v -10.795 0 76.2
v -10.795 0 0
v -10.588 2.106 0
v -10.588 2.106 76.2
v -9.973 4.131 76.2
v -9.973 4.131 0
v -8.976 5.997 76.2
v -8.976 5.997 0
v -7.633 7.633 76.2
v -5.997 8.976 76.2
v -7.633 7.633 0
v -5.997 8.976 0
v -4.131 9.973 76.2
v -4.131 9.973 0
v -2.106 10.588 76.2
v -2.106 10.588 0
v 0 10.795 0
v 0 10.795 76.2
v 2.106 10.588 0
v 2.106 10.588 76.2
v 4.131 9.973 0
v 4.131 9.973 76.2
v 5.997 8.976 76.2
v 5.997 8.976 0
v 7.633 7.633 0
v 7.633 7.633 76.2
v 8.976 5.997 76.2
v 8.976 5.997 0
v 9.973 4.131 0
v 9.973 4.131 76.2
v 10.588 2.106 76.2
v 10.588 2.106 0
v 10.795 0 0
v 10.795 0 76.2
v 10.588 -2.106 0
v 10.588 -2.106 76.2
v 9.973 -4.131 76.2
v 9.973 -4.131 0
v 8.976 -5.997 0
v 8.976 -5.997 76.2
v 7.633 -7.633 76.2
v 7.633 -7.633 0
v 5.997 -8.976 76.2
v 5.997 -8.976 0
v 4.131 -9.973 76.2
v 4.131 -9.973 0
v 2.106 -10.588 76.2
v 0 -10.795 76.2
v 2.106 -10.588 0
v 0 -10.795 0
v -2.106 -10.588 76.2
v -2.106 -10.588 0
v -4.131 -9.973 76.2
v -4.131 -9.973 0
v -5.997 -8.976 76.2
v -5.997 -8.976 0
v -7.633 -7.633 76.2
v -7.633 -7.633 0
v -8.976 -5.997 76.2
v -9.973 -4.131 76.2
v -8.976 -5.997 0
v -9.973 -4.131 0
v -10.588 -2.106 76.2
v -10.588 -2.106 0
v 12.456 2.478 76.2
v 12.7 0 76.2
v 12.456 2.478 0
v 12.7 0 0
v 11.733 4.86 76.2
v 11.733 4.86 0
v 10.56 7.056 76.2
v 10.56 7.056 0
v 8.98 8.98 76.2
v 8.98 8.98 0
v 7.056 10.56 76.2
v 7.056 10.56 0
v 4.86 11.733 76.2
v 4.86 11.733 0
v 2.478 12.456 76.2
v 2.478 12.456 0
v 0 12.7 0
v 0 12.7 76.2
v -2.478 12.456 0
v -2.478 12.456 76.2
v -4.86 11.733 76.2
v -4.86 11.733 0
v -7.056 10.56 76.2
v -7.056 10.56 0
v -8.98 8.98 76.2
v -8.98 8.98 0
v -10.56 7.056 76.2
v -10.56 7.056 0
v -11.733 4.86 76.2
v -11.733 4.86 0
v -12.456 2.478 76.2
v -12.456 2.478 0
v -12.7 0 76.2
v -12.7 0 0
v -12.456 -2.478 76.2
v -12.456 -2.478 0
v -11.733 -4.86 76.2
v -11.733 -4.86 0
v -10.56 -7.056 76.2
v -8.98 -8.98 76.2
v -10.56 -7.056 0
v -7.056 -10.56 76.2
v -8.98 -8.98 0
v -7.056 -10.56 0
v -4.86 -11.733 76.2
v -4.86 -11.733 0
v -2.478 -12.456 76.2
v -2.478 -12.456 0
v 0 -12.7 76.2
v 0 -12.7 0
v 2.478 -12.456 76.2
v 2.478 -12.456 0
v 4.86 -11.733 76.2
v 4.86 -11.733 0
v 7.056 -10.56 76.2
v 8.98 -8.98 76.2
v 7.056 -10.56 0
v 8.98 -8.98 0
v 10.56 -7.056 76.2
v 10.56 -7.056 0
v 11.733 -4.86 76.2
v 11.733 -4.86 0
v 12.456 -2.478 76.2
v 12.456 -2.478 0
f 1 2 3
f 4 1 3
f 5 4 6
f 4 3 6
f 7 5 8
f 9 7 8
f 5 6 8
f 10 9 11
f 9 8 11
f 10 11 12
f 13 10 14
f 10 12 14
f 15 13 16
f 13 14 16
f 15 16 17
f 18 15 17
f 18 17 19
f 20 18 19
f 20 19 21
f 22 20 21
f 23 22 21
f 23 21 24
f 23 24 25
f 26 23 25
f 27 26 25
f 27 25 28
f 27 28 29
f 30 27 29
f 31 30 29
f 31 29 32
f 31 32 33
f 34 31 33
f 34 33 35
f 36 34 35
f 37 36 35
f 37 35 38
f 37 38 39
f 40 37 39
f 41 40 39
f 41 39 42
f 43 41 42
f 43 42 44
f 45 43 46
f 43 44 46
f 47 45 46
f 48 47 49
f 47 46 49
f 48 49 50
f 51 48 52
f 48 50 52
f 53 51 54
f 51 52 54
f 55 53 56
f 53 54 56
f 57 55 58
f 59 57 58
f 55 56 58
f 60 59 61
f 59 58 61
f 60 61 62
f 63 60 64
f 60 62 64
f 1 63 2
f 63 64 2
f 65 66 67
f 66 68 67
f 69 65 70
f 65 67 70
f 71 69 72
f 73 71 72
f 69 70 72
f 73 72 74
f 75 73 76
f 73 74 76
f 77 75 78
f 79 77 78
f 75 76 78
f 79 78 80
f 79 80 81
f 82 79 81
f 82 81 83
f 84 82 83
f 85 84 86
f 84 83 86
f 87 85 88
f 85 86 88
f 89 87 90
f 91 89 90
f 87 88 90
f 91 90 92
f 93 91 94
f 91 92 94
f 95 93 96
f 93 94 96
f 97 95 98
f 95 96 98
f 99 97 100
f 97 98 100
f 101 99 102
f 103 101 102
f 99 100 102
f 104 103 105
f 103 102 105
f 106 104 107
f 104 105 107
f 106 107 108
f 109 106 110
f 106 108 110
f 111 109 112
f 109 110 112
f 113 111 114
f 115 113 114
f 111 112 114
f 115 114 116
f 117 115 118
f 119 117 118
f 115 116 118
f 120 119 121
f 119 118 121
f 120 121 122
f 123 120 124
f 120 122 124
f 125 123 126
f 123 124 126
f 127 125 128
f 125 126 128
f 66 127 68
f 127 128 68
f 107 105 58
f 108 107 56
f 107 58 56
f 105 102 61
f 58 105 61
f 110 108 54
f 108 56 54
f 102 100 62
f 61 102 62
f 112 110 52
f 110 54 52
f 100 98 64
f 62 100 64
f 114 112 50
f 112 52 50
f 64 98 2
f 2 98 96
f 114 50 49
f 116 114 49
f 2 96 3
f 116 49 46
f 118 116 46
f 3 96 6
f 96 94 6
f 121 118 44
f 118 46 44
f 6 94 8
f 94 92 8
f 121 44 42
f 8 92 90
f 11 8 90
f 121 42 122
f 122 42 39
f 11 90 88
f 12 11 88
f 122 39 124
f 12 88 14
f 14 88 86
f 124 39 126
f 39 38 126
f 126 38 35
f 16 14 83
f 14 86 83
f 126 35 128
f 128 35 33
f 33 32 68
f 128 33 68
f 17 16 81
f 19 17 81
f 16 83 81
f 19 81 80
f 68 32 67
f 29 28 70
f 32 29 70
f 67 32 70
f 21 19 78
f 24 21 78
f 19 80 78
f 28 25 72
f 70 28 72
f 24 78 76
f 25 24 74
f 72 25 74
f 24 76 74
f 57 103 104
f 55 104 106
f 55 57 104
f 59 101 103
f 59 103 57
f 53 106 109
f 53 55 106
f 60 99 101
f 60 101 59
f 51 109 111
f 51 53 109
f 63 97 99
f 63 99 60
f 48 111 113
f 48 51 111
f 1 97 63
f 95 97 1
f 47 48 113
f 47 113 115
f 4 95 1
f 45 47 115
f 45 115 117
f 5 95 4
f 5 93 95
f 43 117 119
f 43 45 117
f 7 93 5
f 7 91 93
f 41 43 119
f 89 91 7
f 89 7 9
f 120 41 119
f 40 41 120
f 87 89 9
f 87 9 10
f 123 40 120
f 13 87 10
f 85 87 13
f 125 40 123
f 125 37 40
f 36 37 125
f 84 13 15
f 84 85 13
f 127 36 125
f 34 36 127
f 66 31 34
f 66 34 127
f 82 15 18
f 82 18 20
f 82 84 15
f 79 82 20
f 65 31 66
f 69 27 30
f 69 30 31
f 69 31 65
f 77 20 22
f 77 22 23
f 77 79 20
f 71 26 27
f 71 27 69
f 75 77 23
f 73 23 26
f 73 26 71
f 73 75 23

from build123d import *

# Parameters (mm, degrees)
F0_R      = 12.7
F1_DEPTH  = 50.8
F1_FACE_R = 12.7
F2_DEPTH  = 25.4
F4_D      = 21.59


with BuildPart() as f1:
    # F0 (on Top) → F1 (new body)
    with BuildSketch(Plane.XY):
        Circle(F0_R)
    extrude(amount=F1_DEPTH)

    # F1_face (on face) → F2 (join)
    with BuildSketch(Plane.XY.offset(50.8)):
        Circle(F1_FACE_R)
    extrude(amount=F2_DEPTH)

    # F4 (through all)
    with Locations(Plane.XY.offset(76.2)):
        with Locations((0, 0)):
            Hole(F4_D / 2)


solid = f1.part
